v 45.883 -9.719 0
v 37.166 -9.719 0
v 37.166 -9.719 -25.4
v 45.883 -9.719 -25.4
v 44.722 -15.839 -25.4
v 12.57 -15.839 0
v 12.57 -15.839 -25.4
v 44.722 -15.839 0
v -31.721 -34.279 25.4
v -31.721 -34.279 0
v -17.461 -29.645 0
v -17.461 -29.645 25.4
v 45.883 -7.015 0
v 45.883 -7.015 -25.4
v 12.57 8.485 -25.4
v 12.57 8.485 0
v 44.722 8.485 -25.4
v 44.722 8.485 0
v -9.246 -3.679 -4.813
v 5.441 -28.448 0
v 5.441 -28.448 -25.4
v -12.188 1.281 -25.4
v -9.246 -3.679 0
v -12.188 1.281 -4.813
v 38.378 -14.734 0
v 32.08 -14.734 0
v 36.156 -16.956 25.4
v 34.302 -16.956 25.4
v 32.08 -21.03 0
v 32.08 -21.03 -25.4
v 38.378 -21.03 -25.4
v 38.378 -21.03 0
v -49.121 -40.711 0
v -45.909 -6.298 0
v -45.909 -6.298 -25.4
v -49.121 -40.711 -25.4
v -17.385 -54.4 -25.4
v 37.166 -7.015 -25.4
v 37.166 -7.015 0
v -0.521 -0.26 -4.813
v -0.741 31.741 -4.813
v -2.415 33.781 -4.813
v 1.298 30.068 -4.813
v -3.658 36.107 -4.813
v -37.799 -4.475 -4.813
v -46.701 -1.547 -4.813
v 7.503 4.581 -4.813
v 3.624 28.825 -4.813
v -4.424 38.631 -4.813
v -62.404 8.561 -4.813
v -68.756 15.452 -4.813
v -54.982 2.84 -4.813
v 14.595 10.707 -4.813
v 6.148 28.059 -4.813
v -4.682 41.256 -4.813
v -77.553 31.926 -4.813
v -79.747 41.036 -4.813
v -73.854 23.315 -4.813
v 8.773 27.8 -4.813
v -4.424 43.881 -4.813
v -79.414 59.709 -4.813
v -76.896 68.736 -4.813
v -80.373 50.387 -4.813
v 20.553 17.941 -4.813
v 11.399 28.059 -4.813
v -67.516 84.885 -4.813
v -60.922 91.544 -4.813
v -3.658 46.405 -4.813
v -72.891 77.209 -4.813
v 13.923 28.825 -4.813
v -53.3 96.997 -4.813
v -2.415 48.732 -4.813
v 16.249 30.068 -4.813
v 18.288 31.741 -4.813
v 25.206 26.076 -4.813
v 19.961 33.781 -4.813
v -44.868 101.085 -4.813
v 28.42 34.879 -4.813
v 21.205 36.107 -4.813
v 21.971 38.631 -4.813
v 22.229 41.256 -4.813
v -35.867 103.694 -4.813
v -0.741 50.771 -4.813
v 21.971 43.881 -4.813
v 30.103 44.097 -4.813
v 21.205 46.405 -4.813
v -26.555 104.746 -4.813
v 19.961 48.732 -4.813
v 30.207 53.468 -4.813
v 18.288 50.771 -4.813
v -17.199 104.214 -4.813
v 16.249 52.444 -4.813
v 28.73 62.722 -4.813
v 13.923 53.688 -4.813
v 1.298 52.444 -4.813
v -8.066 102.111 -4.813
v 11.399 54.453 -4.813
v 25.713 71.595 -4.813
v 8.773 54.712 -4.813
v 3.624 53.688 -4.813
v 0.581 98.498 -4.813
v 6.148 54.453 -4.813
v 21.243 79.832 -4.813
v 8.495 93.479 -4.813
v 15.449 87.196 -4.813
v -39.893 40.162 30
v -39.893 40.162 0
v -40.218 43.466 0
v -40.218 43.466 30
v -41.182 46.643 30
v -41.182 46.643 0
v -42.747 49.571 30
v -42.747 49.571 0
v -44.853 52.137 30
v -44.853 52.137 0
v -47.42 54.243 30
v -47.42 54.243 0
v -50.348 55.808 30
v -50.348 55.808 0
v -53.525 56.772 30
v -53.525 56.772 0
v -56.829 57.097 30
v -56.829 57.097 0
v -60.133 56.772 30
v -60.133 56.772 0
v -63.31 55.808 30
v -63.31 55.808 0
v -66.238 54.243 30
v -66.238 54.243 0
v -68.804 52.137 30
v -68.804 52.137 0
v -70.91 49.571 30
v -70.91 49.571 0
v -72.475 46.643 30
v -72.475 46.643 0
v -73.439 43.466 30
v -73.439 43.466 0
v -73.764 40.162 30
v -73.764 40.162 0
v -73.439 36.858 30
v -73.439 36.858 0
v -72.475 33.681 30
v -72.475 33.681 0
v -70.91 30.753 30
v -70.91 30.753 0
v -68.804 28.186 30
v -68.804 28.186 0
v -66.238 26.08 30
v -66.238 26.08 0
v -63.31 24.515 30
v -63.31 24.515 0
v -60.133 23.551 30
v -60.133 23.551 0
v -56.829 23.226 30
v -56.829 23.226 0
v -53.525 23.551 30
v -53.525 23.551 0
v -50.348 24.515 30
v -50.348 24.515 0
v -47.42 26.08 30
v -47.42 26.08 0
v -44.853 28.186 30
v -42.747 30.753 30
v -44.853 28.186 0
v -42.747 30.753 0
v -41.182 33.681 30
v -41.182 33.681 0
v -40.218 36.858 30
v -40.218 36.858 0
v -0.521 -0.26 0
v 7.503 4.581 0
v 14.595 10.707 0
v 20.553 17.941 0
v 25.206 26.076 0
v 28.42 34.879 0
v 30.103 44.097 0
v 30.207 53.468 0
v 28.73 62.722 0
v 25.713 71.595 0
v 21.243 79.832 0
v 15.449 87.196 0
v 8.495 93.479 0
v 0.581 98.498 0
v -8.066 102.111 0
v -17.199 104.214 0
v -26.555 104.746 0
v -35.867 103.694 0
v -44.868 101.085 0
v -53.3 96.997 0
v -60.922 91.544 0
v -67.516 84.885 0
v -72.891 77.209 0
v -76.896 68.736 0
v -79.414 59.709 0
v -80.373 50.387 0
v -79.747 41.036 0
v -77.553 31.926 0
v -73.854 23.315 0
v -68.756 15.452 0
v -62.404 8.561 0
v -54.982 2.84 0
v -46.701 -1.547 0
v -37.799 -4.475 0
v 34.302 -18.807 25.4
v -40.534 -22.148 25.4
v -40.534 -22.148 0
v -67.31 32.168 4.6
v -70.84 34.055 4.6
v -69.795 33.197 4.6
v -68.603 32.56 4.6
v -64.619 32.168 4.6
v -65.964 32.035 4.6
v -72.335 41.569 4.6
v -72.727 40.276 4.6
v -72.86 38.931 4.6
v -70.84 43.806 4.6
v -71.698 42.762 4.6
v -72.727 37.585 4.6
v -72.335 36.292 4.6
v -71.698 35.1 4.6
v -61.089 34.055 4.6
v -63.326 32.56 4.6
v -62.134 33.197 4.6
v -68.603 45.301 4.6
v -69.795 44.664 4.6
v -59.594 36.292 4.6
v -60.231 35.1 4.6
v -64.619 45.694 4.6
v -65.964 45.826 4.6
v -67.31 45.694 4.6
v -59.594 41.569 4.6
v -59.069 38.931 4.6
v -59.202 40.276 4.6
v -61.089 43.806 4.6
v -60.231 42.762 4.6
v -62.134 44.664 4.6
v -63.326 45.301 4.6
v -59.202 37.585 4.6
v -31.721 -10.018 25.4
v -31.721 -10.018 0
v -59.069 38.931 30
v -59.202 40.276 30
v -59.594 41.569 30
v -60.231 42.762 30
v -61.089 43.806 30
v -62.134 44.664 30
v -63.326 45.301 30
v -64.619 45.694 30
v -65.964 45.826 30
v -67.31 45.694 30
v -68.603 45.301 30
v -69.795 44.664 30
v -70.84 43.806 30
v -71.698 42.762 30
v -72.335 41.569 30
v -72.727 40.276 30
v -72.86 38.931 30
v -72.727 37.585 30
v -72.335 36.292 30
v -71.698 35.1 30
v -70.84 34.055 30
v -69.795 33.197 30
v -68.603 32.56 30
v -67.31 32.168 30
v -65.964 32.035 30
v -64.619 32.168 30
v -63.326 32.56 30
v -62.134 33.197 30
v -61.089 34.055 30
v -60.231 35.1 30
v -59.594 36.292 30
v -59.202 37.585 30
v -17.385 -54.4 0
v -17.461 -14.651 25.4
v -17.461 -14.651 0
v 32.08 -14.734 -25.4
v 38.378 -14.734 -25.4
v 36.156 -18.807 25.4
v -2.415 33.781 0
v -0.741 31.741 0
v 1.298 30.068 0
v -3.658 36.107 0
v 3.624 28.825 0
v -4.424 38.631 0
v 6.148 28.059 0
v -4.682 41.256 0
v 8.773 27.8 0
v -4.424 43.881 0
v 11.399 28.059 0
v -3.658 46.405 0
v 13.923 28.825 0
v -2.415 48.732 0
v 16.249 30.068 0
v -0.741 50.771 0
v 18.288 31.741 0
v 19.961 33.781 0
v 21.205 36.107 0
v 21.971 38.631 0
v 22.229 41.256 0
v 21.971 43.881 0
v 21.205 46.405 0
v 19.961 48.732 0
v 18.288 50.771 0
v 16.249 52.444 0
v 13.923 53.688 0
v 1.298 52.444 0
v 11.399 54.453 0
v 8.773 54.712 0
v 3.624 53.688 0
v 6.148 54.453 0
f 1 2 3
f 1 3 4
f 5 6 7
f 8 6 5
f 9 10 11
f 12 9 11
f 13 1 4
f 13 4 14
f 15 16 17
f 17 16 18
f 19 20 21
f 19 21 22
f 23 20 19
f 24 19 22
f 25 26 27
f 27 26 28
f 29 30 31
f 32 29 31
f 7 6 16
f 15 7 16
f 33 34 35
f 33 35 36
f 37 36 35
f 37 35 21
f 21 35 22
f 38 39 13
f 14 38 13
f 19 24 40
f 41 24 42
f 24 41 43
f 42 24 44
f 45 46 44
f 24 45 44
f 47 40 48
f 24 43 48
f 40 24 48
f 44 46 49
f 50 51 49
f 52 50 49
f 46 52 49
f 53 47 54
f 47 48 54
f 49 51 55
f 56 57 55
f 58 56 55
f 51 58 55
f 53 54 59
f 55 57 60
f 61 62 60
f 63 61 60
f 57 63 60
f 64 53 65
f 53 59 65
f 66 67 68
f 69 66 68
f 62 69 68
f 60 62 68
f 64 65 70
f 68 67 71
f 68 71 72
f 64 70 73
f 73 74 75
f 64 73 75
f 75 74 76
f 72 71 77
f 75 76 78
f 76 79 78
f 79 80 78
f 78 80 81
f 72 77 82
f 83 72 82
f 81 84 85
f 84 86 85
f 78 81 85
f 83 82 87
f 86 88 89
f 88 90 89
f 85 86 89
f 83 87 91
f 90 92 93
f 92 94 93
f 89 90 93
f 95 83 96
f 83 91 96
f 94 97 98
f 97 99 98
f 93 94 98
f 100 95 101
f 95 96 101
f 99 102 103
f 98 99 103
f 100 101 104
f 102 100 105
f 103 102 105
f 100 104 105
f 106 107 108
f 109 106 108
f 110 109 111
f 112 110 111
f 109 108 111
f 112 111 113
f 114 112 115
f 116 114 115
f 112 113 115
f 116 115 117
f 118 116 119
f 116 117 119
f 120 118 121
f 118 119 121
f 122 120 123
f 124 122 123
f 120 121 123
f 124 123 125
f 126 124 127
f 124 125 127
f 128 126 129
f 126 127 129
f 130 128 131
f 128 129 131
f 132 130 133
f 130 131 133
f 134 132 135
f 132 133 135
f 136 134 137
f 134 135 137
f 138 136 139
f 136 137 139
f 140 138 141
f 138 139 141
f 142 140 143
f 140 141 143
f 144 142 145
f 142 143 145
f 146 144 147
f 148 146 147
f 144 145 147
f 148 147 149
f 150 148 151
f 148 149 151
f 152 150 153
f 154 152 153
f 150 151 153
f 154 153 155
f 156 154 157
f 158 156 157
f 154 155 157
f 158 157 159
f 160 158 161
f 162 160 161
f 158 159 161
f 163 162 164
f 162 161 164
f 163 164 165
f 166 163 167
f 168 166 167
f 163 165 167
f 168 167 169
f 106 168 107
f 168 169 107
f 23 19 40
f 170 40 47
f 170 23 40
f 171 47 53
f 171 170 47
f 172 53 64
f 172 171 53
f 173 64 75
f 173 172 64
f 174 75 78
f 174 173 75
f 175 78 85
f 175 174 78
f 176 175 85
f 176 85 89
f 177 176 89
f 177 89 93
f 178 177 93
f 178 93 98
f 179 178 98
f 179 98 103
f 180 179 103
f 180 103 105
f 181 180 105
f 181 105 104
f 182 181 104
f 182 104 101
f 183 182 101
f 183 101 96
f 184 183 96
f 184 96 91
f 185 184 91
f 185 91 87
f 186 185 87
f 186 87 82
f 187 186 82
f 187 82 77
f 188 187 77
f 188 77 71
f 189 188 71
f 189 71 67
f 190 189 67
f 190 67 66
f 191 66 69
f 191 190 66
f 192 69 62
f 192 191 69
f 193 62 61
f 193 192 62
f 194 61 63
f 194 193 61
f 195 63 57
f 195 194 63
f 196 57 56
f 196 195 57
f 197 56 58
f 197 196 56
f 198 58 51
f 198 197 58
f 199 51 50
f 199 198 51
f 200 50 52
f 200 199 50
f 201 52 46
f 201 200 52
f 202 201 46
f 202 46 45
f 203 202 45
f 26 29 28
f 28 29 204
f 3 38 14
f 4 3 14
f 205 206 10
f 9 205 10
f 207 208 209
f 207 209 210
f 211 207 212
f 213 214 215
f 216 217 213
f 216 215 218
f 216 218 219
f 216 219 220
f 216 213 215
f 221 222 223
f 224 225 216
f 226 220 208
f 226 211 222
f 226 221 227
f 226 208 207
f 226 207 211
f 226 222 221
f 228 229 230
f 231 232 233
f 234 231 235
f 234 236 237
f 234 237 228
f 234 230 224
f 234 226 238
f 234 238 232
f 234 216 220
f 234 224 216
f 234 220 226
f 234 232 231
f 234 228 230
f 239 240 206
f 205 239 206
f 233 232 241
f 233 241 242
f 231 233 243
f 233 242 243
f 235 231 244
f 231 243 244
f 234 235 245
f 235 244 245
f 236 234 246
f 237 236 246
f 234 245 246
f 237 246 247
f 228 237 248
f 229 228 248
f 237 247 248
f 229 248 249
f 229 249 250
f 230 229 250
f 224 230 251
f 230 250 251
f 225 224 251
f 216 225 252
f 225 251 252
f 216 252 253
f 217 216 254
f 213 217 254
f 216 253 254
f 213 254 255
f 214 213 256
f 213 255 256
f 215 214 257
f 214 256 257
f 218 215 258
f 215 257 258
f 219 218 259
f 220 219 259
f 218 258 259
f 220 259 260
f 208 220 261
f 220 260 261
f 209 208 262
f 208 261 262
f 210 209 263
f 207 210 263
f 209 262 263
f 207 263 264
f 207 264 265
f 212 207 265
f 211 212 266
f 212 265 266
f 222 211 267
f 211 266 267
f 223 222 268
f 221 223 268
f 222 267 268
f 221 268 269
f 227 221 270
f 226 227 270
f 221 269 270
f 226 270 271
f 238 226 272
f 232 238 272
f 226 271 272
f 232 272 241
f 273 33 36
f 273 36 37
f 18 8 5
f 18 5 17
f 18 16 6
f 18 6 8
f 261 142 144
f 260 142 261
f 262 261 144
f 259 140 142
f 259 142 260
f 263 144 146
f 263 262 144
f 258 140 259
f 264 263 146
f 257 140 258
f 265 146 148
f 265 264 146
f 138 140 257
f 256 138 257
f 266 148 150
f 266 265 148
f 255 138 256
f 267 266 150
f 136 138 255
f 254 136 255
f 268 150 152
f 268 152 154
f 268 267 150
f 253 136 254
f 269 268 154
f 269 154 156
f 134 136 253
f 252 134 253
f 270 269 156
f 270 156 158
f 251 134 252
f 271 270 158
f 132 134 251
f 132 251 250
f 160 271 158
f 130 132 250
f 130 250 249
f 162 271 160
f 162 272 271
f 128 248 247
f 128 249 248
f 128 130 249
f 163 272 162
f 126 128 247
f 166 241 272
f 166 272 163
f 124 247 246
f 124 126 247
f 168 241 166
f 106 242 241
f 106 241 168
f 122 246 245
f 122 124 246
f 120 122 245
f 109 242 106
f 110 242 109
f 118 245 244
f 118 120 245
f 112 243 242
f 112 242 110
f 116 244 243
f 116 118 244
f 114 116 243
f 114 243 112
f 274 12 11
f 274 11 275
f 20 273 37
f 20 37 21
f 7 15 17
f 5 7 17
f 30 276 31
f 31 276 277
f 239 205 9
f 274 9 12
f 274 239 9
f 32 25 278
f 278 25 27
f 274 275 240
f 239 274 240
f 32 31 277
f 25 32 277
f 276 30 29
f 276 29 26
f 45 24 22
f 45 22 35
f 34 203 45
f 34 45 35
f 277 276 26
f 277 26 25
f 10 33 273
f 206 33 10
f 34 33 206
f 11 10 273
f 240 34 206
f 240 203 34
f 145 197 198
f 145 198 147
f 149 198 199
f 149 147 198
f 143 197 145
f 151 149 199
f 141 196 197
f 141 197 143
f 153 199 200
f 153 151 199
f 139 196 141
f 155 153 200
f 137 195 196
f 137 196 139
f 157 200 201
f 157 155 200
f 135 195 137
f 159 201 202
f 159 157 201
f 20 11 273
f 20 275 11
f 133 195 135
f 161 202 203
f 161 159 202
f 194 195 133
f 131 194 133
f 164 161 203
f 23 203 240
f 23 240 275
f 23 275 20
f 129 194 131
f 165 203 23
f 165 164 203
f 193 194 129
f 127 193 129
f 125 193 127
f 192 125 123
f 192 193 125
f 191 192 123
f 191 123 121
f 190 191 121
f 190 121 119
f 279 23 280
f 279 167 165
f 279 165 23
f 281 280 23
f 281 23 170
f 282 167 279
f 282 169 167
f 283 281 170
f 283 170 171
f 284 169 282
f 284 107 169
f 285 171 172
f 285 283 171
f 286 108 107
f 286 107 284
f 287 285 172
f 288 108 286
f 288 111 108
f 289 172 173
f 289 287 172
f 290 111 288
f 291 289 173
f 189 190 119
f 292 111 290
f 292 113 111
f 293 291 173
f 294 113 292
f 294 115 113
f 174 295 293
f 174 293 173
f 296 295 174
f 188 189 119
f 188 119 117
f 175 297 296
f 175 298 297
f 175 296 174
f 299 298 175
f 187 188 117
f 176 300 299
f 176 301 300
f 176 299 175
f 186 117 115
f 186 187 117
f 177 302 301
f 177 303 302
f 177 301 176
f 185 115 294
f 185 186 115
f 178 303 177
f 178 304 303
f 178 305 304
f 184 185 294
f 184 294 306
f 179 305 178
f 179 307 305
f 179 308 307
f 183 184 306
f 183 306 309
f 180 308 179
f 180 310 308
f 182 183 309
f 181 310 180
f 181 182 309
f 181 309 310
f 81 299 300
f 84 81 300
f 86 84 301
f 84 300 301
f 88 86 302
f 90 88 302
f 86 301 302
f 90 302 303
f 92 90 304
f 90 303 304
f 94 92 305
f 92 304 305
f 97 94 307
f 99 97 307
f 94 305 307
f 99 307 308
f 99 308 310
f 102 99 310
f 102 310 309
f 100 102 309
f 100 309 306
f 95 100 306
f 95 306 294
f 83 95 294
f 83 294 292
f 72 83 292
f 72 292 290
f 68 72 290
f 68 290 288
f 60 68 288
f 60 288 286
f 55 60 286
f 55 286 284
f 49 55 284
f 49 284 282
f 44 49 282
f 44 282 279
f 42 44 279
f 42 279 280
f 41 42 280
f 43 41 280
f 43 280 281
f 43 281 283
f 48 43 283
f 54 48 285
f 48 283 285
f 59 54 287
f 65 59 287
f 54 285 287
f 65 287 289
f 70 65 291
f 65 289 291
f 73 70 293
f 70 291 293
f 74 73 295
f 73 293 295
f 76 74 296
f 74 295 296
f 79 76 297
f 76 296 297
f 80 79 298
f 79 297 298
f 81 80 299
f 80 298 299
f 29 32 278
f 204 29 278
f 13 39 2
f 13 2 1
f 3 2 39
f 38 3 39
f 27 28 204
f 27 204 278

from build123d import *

# Parameters (mm, degrees)
F1_DEPTH  = 25.4
F3_DEPTH  = 25.4
F4_R      = 55.3696908203
F5_DEPTH  = 4.81279
F6_R      = 16.9357001353
F7_DEPTH  = 30
F8_W      = 6.2986317609
F8_H      = 6.295548482
F9_DEPTH  = 25.4
F9_TAPER  = 5
F11_DEPTH = 25.4
F13_R     = 13.4557054257
F14_DEPTH = 25.4
F15_R     = 6.8954007083
F16_DEPTH = 25.4
F17_W     = 6.2986317609
F17_H     = 6.295548482
F17_W_2   = 8.7175125246
F17_H_2   = 2.7040438727
F18_DEPTH = 25.4
F19_W     = 32.152608037
F19_H     = 24.3234690279
F20_DEPTH = 25.4


with BuildPart() as f1:
    # F0 (on Top) → F1 (new body)
    with BuildSketch(Plane.XY):
        Polygon((-17.3853552728, -54.3998687475), (5.4408759637, -28.4475700051), (-12.1875334984, 1.2811673093), (-45.9087209501, -6.2977613302), (-49.1211514741, -40.7105341421), align=None)
    extrude(amount=-F1_DEPTH)

    # F4 (on Top) → F5 (join)
    with BuildSketch(Plane.XY):
        with Locations((-25.0124167651, 49.3981949985)):
            Circle(F4_R)
    extrude(amount=-F5_DEPTH)

    # F6 (on face) → F7 (join)
    with BuildSketch(Plane.XY):
        with Locations((-56.8287335336, 40.1616469026)):
            Circle(F6_R)
    extrude(amount=F7_DEPTH)

    # F10 (on face) → F11 (join)
    with BuildSketch(Plane.XY):
        Polygon((-17.4606181681, -29.6451992292), (-17.4606181681, -14.6510579687), (-31.7208939202, -10.0176135031), (-40.5342290239, -22.1481285989), (-31.7208939202, -34.2786436947), align=None)
    extrude(amount=F11_DEPTH)

    # F13 (on face) → F14 (cut)
    with BuildSketch(Plane.XY):
        with Locations((8.7734460831, 41.2560999393)):
            Circle(F13_R)
    extrude(amount=-F14_DEPTH, mode=Mode.SUBTRACT)

    # F15 (on face) → F16 (cut)
    with BuildSketch(Plane.XY.offset(30)):
        with Locations((-65.9644976258, 38.9307104051)):
            Circle(F15_R)
    extrude(amount=-F16_DEPTH, mode=Mode.SUBTRACT)


with BuildPart() as f3:
    # F2 (on Top) → F3 (new body)
    with BuildSketch(Plane.XY):
        with BuildLine():
            ThreePointArc((37.1658151979, -30.5278390569), (48.7683803474, -2.7776239919), (22.9083637053, -18.1384017546))
            ThreePointArc((22.9083637053, -18.1384017546), (29.0679050453, -25.4484333392), (37.1658151979, -30.5278390569))
        make_face()
    extrude(amount=-F3_DEPTH)

    # F8 (on face) → F9 (join)
    with BuildSketch(Plane.XY):
        with Locations((35.2290758657, -17.881934666)):
            Rectangle(F8_W, F8_H)
    extrude(amount=F9_DEPTH, taper=F9_TAPER)

    # F17 (on face) → F18 (cut)
    with BuildSketch(Plane.XY):
        with BuildLine():
            ThreePointArc((37.1658151979, -30.5278390569), (48.7683803474, -2.7776239919), (22.9083637053, -18.1384017546))
            ThreePointArc((22.9083637053, -18.1384017546), (29.0679050453, -25.4484333392), (37.1658151979, -30.5278390569))
        make_face()
        with Locations((35.2290758657, -17.881934666)):
            Rectangle(F17_W, F17_H, mode=Mode.SUBTRACT)
        with Locations((41.5245714602, -8.3671226166)):
            Rectangle(F17_W_2, F17_H_2, mode=Mode.SUBTRACT)
    extrude(amount=-F18_DEPTH, mode=Mode.SUBTRACT)


with BuildPart() as f20:
    # F19 (on Top) → F20 (new body)
    with BuildSketch(Plane.XY):
        with Locations((28.6461897194, -3.6770114675)):
            Rectangle(F19_W, F19_H)
    extrude(amount=-F20_DEPTH)


solid = Compound([f1.part, f3.part, f20.part])
